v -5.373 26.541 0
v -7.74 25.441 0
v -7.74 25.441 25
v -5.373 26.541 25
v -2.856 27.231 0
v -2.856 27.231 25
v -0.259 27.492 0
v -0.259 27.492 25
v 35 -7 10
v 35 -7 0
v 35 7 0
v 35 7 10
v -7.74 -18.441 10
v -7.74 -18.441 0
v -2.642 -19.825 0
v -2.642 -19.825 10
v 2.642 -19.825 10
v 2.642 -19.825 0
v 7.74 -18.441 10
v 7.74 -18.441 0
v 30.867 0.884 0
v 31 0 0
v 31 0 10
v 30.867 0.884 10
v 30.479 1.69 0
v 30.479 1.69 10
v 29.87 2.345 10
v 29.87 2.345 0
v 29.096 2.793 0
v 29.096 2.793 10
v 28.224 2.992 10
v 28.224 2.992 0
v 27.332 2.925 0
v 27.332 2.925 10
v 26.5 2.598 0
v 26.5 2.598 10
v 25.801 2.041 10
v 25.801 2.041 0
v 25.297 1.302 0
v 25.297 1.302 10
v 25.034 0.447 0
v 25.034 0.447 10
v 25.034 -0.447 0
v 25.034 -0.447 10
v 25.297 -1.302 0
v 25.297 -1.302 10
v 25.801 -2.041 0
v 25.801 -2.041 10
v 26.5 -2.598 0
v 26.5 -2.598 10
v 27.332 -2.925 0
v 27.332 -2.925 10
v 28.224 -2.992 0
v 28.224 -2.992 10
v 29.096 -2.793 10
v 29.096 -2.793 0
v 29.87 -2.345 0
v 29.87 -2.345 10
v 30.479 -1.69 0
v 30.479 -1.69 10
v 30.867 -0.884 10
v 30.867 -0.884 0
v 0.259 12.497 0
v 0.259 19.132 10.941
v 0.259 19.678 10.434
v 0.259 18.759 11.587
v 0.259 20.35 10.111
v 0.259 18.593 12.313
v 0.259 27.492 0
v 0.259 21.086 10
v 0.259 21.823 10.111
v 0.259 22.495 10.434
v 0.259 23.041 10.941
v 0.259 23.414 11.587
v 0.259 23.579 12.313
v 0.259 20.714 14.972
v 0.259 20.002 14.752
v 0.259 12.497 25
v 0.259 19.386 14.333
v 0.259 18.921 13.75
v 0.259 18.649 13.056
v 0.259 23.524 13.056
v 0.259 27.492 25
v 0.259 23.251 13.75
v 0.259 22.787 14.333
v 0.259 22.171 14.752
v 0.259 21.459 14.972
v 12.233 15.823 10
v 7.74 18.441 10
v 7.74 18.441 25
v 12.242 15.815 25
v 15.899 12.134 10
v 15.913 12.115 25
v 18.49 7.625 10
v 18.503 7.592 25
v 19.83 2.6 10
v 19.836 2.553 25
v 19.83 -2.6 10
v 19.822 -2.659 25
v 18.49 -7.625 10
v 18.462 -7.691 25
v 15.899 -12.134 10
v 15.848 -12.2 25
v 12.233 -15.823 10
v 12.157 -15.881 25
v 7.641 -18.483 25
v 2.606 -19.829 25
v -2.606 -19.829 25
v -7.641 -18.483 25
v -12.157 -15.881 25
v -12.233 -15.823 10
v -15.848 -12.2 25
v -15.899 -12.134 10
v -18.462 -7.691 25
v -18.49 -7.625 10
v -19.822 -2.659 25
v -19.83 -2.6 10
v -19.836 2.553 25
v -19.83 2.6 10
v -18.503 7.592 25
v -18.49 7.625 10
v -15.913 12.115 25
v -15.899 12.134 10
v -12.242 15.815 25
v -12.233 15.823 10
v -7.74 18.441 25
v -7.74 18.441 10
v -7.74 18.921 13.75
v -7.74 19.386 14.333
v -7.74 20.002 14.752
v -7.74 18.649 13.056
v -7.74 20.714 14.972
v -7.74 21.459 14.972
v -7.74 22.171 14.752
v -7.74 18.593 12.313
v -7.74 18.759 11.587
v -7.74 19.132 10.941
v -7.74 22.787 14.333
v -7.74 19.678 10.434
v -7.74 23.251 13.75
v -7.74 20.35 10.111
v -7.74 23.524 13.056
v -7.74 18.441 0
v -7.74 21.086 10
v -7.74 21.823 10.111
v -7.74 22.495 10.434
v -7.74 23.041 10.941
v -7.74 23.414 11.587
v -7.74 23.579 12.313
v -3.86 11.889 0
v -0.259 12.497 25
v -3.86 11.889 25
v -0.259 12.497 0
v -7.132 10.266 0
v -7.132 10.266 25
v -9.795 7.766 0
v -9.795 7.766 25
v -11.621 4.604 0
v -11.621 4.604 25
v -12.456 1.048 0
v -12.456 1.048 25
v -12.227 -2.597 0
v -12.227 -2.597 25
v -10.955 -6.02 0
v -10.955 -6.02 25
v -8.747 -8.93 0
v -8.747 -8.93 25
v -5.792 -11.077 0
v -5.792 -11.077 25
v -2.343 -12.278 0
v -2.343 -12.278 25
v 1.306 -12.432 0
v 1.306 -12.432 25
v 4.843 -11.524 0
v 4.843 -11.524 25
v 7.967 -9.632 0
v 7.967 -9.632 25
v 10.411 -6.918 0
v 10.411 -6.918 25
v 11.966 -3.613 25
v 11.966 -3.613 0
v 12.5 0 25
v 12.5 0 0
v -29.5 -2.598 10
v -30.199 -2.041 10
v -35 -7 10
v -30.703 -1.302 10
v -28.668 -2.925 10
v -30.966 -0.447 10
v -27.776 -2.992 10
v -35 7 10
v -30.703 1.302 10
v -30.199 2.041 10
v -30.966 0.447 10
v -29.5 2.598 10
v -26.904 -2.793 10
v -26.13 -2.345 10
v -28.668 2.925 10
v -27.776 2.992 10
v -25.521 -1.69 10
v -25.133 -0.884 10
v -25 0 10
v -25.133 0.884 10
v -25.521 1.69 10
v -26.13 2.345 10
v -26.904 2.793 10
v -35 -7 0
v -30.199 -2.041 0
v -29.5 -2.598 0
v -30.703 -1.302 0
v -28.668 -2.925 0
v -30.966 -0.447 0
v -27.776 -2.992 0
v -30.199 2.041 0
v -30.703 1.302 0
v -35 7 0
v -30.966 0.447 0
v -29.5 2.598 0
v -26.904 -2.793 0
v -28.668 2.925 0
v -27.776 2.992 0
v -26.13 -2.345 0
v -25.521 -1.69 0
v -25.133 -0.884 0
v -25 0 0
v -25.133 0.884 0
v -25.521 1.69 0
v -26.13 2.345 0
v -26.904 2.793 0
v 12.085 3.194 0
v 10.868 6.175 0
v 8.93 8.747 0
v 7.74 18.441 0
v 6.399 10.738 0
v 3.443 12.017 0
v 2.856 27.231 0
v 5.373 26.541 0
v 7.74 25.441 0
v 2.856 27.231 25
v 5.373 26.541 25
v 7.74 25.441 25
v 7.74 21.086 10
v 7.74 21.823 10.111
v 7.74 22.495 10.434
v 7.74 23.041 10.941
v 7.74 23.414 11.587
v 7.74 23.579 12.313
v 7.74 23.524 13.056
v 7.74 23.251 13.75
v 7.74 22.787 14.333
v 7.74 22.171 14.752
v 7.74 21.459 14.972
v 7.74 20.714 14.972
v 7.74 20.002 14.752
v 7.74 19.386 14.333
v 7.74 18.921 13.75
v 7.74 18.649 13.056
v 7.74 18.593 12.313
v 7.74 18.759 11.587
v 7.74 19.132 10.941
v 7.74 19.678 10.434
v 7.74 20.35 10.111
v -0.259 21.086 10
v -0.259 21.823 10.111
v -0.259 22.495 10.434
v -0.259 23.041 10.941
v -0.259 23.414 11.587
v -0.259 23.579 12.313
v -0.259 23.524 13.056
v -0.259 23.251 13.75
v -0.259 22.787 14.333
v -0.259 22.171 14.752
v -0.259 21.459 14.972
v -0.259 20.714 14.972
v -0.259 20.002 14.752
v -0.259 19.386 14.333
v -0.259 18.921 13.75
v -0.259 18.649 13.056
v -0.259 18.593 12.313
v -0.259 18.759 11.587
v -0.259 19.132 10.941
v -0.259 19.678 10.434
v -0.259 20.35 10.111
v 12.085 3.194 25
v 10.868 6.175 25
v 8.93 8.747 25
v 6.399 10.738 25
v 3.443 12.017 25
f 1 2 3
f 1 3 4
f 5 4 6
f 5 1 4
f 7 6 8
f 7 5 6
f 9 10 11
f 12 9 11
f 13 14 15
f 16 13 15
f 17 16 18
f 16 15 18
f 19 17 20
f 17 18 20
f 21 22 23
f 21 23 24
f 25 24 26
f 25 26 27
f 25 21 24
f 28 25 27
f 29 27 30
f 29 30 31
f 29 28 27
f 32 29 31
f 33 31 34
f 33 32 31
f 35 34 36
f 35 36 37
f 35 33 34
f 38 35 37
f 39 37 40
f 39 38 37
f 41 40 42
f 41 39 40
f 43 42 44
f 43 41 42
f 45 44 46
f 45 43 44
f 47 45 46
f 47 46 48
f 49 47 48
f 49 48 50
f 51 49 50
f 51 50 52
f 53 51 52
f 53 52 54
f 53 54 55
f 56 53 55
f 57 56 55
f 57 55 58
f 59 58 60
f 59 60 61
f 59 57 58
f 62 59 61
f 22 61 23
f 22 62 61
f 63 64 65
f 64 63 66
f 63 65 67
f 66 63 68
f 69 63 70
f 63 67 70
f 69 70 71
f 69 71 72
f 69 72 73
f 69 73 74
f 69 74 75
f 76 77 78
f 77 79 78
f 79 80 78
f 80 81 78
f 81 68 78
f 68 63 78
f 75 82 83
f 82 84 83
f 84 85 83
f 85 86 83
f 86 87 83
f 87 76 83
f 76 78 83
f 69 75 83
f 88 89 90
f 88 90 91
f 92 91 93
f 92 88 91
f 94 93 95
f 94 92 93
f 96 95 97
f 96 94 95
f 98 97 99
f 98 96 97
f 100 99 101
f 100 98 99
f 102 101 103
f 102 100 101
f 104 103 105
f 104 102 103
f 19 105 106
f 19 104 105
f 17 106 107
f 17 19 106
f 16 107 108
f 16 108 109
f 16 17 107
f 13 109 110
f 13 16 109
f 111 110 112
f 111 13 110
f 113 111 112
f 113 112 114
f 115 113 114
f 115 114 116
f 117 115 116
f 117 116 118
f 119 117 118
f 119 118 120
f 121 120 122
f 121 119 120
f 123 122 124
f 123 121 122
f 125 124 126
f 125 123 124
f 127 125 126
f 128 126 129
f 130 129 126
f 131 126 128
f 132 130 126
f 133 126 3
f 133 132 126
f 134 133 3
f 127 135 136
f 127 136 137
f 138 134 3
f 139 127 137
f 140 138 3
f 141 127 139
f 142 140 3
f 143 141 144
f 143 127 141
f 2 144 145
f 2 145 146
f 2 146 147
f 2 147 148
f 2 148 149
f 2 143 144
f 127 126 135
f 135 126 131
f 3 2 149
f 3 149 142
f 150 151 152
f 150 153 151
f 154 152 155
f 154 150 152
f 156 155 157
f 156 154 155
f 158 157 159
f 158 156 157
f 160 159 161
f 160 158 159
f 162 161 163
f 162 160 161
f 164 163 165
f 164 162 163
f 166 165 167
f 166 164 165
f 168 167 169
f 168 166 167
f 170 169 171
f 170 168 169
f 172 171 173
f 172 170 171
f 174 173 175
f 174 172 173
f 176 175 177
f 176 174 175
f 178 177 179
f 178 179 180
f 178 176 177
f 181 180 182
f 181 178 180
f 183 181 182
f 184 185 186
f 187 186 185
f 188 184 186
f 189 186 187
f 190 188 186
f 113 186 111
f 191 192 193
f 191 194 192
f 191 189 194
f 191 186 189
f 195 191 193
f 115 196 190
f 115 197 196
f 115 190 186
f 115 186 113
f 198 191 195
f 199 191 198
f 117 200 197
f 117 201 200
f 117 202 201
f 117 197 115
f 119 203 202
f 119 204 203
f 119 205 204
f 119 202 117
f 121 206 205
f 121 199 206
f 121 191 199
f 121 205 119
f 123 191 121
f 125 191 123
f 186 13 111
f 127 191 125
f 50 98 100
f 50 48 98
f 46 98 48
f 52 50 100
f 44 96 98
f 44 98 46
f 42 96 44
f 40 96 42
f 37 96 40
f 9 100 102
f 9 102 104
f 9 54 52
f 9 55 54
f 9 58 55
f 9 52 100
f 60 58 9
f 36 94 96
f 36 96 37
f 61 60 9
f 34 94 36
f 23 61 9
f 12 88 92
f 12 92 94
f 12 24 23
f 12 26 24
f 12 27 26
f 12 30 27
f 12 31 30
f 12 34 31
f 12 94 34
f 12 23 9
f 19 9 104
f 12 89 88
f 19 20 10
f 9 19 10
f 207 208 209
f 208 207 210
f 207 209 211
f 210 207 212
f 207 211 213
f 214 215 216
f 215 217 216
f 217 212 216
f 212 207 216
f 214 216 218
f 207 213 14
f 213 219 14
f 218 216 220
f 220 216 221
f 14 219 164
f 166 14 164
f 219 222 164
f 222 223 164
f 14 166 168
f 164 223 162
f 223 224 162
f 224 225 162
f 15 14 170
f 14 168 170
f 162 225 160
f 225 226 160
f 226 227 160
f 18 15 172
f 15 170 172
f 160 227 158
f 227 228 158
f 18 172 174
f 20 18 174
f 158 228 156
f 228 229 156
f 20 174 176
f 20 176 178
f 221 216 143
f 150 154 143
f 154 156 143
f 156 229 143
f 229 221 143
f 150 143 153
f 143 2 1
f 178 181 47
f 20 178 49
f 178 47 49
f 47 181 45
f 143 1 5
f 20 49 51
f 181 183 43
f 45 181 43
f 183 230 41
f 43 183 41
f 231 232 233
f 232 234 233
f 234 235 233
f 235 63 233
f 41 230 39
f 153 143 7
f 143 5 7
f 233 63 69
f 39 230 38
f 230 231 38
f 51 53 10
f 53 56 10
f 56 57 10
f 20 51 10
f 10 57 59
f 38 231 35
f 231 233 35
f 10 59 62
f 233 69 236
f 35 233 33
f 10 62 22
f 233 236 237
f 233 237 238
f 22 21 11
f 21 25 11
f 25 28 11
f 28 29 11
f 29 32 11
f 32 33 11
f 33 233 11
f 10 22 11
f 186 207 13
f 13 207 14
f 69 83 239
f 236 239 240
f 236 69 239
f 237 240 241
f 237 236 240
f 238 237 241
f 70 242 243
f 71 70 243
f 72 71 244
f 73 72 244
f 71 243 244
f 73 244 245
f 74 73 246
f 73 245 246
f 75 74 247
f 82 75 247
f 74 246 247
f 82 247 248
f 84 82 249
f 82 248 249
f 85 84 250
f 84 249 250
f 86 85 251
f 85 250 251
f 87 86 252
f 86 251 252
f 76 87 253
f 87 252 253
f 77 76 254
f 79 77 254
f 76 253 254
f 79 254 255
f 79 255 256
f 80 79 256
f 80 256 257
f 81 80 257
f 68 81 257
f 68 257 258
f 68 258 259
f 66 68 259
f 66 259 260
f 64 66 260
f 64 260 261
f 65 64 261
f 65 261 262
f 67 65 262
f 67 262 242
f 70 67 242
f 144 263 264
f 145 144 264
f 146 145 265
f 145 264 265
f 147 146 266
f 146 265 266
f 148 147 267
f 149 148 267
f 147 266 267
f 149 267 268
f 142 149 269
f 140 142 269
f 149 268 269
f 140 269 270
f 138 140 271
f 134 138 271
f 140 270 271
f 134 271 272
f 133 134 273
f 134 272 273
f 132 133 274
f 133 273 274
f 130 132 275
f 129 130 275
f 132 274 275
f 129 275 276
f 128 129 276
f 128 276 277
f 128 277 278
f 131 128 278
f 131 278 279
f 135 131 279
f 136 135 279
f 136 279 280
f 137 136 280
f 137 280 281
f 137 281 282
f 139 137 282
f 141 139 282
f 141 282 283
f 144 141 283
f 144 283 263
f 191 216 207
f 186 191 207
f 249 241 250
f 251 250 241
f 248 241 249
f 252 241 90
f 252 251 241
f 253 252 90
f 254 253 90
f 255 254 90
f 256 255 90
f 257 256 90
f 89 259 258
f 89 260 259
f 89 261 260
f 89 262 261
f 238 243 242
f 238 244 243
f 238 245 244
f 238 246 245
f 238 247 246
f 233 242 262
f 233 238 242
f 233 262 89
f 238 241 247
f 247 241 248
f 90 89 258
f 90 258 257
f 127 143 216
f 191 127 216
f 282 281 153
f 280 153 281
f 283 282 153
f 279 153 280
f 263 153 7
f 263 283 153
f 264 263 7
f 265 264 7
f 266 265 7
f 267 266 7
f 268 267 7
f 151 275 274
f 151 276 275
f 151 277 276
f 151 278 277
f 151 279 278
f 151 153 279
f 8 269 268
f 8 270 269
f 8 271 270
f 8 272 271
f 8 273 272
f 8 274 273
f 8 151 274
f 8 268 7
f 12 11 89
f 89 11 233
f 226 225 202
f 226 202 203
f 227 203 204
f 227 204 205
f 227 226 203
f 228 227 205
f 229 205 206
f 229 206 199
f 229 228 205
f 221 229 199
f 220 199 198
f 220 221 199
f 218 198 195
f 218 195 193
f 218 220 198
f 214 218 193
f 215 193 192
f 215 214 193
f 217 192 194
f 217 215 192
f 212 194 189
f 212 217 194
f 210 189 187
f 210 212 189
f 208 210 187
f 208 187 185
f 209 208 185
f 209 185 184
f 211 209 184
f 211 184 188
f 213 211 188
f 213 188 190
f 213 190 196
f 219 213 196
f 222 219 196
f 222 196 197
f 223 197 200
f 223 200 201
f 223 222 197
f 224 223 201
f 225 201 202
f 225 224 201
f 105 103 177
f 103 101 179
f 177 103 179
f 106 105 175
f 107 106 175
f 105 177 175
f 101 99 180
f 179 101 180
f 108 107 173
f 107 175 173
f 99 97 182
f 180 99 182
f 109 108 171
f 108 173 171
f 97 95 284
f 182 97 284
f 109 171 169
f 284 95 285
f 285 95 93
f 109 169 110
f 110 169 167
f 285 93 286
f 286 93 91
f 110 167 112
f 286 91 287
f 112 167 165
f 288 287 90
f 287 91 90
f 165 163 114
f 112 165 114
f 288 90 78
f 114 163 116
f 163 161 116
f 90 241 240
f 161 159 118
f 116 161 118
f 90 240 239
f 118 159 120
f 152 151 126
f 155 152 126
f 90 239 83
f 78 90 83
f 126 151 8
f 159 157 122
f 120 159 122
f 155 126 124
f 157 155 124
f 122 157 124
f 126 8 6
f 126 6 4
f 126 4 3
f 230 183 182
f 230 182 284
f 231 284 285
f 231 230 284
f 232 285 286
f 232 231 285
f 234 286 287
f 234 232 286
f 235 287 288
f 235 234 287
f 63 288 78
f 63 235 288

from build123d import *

# Parameters (mm, degrees)
SKETCH_1_R          = 3
SKETCH_1_R_2        = 12.5
EXTRUDE_2_DEPTH     = 10
SKETCH_2_R          = 12.5
EXTRUDE_3_DEPTH     = 15
SKETCH_3_W          = 0.517195108
SKETCH_3_H          = 18.726193104
CUT_EXTRUDE_1_DEPTH = 26
SKETCH_4_R          = 2.5
CUT_EXTRUDE_2_DEPTH = 43.740275714


with BuildPart() as part:
    # 草图1 → 凸台-拉伸2 (new body)
    with BuildSketch(Plane.XY):
        with BuildLine():
            Line((-35, -7), (-7.740275714, -18.44147857))
            ThreePointArc((-7.740275714, -18.44147857), (0, -20), (7.740275714, -18.44147857))
            Line((7.740275714, -18.44147857), (35, -7))
            Line((35, -7), (35, 7))
            Line((35, 7), (7.740275714, 18.44147857))
            Line((7.740275714, 18.44147857), (7.740275714, 25.44147857))
            ThreePointArc((7.740275714, 25.44147857), (0, 27.494244152), (-7.740275714, 25.44147857))
            Line((-7.740275714, 25.44147857), (-7.740275714, 18.44147857))
            Line((-7.740275714, 18.44147857), (-35, 7))
            Line((-35, 7), (-35, -7))
        make_face()
        with Locations((-28, 0)):
            Circle(SKETCH_1_R, mode=Mode.SUBTRACT)
        Circle(SKETCH_1_R_2, mode=Mode.SUBTRACT)
        with Locations((28, 0)):
            Circle(SKETCH_1_R, mode=Mode.SUBTRACT)
    extrude(amount=EXTRUDE_2_DEPTH)

    # 草图2 → 凸台-拉伸3 (add)
    with BuildSketch(Plane.XY.offset(10)):
        with BuildLine():
            Line((-7.740275714, 18.44147857), (-7.740275714, 25.44147857))
            ThreePointArc((-7.740275714, 25.44147857), (0, 27.494244152), (7.740275714, 25.44147857))
            Line((7.740275714, 25.44147857), (7.740275714, 18.44147857))
            ThreePointArc((7.740275714, 18.44147857), (0, -20), (-7.740275714, 18.44147857))
        make_face()
        Circle(SKETCH_2_R, mode=Mode.SUBTRACT)
    extrude(amount=EXTRUDE_3_DEPTH)

    # 草图3 → 切除-拉伸1 (cut, through all)
    with BuildSketch(Plane.XY.offset(25)):
        with Locations((0, 21.741202931)):
            Rectangle(SKETCH_3_W, SKETCH_3_H)
    extrude(amount=-CUT_EXTRUDE_1_DEPTH, mode=Mode.SUBTRACT)

    # 草图4 → 切除-拉伸2 (cut, through all)
    with BuildSketch(Plane(origin=(7.740275714, 0, 0), x_dir=(0, 0, -1), z_dir=(1, 0, 0))):
        with Locations((-12.5, 21.086423576)):
            Circle(SKETCH_4_R)
    extrude(amount=-CUT_EXTRUDE_2_DEPTH, mode=Mode.SUBTRACT)


solid = part.part
